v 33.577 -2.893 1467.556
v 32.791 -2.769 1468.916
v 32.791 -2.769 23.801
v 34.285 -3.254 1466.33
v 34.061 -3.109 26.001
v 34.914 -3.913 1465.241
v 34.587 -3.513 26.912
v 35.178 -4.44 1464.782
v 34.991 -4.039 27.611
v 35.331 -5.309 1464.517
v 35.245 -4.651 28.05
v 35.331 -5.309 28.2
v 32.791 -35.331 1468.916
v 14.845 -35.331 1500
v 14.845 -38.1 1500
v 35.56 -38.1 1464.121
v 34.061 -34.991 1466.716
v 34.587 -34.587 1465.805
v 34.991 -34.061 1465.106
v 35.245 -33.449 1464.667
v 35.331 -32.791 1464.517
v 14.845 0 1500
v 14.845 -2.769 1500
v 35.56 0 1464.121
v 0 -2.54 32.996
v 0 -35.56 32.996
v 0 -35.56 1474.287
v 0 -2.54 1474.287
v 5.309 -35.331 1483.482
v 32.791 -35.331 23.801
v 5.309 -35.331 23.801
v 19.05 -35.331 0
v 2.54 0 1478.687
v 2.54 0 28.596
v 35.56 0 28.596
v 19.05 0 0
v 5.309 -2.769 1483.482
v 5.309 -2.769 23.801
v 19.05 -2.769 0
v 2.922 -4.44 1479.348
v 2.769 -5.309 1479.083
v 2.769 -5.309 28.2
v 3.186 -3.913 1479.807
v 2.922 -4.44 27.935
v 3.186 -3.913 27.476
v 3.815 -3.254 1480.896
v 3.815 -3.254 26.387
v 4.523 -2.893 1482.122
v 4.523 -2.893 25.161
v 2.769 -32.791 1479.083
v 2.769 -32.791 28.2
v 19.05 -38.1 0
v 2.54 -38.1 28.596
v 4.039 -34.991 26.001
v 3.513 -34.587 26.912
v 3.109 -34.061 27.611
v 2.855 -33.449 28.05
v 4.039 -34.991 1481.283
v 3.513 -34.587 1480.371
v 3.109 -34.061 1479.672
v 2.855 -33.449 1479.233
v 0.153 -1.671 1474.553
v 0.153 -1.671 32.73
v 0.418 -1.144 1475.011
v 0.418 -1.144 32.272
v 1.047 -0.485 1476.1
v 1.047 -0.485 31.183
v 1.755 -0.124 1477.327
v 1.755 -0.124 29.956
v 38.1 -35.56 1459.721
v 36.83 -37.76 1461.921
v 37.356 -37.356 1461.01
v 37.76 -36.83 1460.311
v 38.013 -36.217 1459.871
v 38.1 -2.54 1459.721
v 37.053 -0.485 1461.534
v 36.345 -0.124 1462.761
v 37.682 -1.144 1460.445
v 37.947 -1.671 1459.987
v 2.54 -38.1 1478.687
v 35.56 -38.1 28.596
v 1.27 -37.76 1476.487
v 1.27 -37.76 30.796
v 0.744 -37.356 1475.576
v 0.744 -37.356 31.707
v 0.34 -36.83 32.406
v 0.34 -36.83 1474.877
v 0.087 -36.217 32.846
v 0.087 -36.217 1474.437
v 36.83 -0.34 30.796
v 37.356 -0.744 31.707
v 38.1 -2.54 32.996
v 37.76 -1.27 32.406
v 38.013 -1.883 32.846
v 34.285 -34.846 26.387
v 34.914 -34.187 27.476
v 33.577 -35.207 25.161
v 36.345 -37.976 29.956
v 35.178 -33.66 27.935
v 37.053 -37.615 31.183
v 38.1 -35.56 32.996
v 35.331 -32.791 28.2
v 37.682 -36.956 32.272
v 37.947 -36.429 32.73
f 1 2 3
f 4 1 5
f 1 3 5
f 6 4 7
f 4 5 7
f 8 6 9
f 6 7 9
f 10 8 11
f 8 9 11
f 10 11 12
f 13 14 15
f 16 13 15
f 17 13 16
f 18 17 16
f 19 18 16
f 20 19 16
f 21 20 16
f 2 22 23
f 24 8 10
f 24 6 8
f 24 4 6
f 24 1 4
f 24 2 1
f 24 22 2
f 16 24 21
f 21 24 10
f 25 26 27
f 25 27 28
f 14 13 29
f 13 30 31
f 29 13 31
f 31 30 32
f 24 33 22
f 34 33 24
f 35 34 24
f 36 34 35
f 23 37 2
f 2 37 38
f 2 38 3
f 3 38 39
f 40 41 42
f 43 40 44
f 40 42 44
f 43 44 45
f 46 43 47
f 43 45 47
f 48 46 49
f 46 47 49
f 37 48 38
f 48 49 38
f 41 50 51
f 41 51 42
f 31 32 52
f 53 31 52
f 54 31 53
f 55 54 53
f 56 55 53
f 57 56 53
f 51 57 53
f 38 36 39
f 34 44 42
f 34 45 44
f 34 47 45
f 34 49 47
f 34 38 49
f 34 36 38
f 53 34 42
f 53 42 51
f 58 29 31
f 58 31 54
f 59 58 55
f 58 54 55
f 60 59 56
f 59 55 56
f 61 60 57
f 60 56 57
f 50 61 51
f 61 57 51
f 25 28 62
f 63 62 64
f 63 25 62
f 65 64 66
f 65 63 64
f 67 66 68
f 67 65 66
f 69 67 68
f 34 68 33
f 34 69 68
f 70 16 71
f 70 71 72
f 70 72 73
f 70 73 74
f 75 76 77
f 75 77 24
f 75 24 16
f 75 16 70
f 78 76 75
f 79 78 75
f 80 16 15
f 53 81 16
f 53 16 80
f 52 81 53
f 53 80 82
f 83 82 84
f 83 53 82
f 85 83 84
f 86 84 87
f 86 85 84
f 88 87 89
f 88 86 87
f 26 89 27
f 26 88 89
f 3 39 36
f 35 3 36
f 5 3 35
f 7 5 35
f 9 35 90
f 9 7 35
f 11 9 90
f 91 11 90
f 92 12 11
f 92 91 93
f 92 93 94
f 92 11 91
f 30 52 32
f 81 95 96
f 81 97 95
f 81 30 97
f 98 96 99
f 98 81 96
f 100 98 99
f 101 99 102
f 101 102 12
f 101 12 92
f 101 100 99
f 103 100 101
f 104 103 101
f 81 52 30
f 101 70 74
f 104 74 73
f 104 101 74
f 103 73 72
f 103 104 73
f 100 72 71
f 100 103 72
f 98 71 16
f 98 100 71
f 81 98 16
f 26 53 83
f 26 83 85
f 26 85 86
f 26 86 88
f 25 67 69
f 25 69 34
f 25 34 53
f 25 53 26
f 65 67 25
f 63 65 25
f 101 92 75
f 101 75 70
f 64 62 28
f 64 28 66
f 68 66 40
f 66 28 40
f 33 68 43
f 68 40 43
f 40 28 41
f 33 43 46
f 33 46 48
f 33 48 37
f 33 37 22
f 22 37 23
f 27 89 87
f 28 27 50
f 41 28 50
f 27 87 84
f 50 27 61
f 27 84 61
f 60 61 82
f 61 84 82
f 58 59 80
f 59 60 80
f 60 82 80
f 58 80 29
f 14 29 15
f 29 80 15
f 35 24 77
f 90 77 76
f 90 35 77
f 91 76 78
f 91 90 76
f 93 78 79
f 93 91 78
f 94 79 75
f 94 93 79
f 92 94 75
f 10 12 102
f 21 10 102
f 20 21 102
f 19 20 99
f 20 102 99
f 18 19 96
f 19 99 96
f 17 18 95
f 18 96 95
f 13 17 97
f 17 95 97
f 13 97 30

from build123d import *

# Parameters (mm, degrees)
BOSS_EXTRUDE1_DEPTH     = 1500
CUT_EXTRUDE1_DEPTH      = 1501.967428028
CUT_EXTRUDE1_DEPTH_BACK = 1501.967428028
CUT_EXTRUDE2_DEPTH      = 1501.967428028
CUT_EXTRUDE2_DEPTH_BACK = 1501.967428028


with BuildPart() as part:
    # Sketch1 → Boss-Extrude1 (new body)
    with BuildSketch(Plane.XY):
        with BuildLine():
            Line((2.54, 0), (35.56, 0))
            ThreePointArc((35.56, 0), (37.356051224, -0.743948776), (38.1, -2.54))
            Line((38.1, -2.54), (38.1, -35.56))
            ThreePointArc((38.1, -35.56), (37.356051224, -37.356051224), (35.56, -38.1))
            Line((35.56, -38.1), (2.54, -38.1))
            ThreePointArc((2.54, -38.1), (0.743948776, -37.356051224), (0, -35.56))
            Line((0, -35.56), (0, -2.54))
            ThreePointArc((0, -2.54), (0.743948776, -0.743948776), (2.54, 0))
        make_face()
        with BuildLine():
            Line((5.3086, -2.7686), (32.7914, -2.7686))
            ThreePointArc((32.7914, -2.7686), (34.587451224, -3.512548776), (35.3314, -5.3086))
            Line((35.3314, -5.3086), (35.3314, -32.7914))
            ThreePointArc((35.3314, -32.7914), (34.587451224, -34.587451224), (32.7914, -35.3314))
            Line((32.7914, -35.3314), (5.3086, -35.3314))
            ThreePointArc((5.3086, -35.3314), (3.512548776, -34.587451224), (2.7686, -32.7914))
            Line((2.7686, -32.7914), (2.7686, -5.3086))
            ThreePointArc((2.7686, -5.3086), (3.512548776, -3.512548776), (5.3086, -2.7686))
        make_face(mode=Mode.SUBTRACT)
    extrude(amount=BOSS_EXTRUDE1_DEPTH)

    # Sketch2 → Cut-Extrude1 (cut, two sides: drawn at the far end of the back side and taken through both)
    with BuildSketch(Plane(origin=(0, 0, 0), x_dir=(1, 0, 0), z_dir=(0, 1, 0)).offset(-CUT_EXTRUDE1_DEPTH_BACK)):
        Polygon((19.05, 0), (38.1, -32.995567884), (38.1, 0), align=None)
        Polygon((0, -1500), (0, -1474.287456108), (14.845144137, -1500), align=None)
    extrude(amount=CUT_EXTRUDE1_DEPTH + CUT_EXTRUDE1_DEPTH_BACK, mode=Mode.SUBTRACT)

    # Sketch3 → Cut-Extrude2 (cut, two sides: drawn at the far end of the back side and taken through both)
    with BuildSketch(Plane.XZ.offset(38.1).offset(-CUT_EXTRUDE2_DEPTH_BACK)):
        Polygon((35.56, 1500), (14.845144137, 1500), (35.56, 1464.120817175), align=None)
        Polygon((35.56, 1500), (35.56, 1464.120817175), (38.1, 1459.721408123), (38.1, 1500), align=None)
        Polygon((2.54, 0), (2.54, 28.596158833), (0, 32.995567884), (0, 0), align=None)
        Polygon((19.05, 0), (2.54, 28.596158833), (2.54, 0), align=None)
    extrude(amount=CUT_EXTRUDE2_DEPTH + CUT_EXTRUDE2_DEPTH_BACK, mode=Mode.SUBTRACT)


solid = part.part
